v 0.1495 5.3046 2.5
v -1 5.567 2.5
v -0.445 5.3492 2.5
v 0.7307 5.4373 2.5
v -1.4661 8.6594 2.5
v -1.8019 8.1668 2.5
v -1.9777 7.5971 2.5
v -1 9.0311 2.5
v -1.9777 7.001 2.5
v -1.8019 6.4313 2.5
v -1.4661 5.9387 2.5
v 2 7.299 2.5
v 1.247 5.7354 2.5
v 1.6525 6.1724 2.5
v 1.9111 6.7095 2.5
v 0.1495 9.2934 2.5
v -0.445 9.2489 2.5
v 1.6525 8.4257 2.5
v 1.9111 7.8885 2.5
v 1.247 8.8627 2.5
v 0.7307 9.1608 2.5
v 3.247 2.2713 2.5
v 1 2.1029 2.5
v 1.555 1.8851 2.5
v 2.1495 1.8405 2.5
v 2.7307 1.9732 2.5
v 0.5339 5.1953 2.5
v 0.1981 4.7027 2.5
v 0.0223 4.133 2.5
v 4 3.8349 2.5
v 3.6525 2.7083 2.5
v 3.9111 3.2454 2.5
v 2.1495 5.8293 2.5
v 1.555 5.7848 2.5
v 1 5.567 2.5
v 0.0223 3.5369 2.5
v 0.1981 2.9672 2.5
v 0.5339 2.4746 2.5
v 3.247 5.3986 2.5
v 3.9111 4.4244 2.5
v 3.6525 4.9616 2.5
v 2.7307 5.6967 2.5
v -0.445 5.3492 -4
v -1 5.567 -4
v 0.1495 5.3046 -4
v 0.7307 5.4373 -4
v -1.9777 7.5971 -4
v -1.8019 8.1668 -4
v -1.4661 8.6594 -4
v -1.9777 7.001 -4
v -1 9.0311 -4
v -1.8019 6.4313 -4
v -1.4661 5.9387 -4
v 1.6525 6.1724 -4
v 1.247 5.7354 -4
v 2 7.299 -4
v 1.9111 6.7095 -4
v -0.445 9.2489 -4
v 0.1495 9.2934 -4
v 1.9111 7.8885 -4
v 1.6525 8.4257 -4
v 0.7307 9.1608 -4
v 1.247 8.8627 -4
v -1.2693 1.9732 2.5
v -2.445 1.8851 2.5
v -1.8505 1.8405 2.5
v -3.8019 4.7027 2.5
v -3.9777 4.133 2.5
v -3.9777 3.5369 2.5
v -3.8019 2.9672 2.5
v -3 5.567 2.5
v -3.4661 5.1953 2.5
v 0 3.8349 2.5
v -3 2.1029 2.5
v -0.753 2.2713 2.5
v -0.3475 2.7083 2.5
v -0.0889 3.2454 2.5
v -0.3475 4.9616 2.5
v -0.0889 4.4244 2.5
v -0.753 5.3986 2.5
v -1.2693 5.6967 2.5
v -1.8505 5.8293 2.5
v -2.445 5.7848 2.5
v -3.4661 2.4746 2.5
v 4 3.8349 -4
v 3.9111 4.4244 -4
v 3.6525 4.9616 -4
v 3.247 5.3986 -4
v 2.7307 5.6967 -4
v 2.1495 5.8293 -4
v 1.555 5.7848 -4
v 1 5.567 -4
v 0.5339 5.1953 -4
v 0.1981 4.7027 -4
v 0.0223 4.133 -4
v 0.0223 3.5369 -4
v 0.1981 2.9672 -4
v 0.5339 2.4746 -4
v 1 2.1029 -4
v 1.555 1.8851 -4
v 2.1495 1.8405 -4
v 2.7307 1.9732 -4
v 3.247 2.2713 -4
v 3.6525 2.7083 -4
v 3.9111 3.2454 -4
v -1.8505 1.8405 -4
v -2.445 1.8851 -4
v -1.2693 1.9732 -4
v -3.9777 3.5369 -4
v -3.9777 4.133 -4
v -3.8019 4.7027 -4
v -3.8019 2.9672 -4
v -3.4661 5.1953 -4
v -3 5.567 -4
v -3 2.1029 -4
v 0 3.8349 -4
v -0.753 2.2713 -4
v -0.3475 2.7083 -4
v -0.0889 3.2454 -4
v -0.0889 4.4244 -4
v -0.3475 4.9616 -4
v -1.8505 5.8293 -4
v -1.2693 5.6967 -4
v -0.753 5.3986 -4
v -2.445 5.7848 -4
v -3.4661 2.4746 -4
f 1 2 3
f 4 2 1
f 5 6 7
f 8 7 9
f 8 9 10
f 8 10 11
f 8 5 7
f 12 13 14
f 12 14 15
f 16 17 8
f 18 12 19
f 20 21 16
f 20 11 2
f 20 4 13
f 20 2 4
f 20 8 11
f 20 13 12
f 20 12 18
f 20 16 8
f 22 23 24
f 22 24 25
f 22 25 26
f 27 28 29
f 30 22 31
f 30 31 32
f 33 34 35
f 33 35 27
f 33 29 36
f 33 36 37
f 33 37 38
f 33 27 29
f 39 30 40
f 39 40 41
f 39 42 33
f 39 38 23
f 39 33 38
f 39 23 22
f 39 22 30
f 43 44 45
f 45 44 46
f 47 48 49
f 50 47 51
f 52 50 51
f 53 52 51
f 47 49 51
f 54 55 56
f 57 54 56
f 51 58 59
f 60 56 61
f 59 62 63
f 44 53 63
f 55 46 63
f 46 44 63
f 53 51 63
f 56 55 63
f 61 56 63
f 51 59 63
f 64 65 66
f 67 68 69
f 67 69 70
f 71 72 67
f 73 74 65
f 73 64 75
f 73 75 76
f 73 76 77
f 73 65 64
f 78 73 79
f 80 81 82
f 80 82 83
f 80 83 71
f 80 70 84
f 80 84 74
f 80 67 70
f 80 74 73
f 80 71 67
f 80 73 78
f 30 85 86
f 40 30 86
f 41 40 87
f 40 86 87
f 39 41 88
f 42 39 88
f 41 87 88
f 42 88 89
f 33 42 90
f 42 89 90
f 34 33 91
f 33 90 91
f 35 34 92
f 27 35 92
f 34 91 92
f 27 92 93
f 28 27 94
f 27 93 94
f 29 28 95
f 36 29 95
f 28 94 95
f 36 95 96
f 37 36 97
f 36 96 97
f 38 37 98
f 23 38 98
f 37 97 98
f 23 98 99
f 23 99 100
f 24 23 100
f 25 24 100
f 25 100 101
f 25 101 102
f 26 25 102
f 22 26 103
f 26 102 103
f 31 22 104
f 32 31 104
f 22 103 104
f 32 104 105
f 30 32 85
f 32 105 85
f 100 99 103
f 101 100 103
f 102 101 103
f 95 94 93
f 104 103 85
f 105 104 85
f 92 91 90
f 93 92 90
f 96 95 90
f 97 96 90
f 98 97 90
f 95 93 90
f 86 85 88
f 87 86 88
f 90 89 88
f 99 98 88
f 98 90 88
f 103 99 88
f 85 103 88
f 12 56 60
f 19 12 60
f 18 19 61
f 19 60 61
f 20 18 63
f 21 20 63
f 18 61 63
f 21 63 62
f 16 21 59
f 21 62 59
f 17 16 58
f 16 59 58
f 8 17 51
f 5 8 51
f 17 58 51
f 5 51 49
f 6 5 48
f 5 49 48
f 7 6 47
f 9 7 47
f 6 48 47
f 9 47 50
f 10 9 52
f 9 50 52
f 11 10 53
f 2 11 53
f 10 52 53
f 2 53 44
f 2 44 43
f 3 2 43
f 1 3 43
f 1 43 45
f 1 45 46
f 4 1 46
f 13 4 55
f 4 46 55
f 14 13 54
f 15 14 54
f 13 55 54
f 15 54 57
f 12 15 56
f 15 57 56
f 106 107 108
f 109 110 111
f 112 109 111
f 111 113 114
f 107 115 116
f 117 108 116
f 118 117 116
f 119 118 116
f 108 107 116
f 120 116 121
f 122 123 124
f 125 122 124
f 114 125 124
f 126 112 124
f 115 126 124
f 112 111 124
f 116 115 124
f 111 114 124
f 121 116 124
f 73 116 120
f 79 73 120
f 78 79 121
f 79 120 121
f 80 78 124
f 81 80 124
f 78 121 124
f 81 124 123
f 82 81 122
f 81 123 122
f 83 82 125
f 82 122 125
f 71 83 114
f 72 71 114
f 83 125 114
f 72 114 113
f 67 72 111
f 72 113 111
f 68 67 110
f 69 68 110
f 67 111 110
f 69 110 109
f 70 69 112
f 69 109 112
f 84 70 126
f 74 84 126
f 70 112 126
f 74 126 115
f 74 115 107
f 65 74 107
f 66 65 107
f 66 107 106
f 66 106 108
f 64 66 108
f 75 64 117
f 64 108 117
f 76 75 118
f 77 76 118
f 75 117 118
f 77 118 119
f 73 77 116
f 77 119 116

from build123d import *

# Parameters (mm, degrees)
EXTRUDE_1_DEPTH        = 2.5
EXTRUDE_1_DEPTH_BACK   = 4
SKETCH_1_R             = 2
EXTRUDE_1_2_DEPTH      = 2.5
EXTRUDE_1_2_DEPTH_BACK = 4
EXTRUDE_1_3_DEPTH      = 2.5
EXTRUDE_1_3_DEPTH_BACK = 4


with BuildPart() as part:
    # Эскиз1 → Бобышка-Вытянуть1 (new, two sides: drawn at the far end of the back side and taken through both)
    with BuildSketch(Plane.XY.offset(-EXTRUDE_1_DEPTH_BACK)):
        with Locations((-2, 3.834936491)):
            Circle(SKETCH_1_R)
    extrude(amount=EXTRUDE_1_DEPTH + EXTRUDE_1_DEPTH_BACK)


with BuildPart() as body_2:
    # Эскиз1 → Extrude 1 2 (new, two sides: drawn at the far end of the back side and taken through both)
    with BuildSketch(Plane.XY.offset(-EXTRUDE_1_2_DEPTH_BACK)):
        with Locations((0, 7.299038106)):
            Circle(SKETCH_1_R)
    extrude(amount=EXTRUDE_1_2_DEPTH + EXTRUDE_1_2_DEPTH_BACK)


with BuildPart() as body_3:
    # Эскиз1 → Extrude 1 3 (new, two sides: drawn at the far end of the back side and taken through both)
    with BuildSketch(Plane.XY.offset(-EXTRUDE_1_3_DEPTH_BACK)):
        with Locations((2, 3.834936491)):
            Circle(SKETCH_1_R)
    extrude(amount=EXTRUDE_1_3_DEPTH + EXTRUDE_1_3_DEPTH_BACK)


solid = Compound([part.part, body_2.part, body_3.part])
